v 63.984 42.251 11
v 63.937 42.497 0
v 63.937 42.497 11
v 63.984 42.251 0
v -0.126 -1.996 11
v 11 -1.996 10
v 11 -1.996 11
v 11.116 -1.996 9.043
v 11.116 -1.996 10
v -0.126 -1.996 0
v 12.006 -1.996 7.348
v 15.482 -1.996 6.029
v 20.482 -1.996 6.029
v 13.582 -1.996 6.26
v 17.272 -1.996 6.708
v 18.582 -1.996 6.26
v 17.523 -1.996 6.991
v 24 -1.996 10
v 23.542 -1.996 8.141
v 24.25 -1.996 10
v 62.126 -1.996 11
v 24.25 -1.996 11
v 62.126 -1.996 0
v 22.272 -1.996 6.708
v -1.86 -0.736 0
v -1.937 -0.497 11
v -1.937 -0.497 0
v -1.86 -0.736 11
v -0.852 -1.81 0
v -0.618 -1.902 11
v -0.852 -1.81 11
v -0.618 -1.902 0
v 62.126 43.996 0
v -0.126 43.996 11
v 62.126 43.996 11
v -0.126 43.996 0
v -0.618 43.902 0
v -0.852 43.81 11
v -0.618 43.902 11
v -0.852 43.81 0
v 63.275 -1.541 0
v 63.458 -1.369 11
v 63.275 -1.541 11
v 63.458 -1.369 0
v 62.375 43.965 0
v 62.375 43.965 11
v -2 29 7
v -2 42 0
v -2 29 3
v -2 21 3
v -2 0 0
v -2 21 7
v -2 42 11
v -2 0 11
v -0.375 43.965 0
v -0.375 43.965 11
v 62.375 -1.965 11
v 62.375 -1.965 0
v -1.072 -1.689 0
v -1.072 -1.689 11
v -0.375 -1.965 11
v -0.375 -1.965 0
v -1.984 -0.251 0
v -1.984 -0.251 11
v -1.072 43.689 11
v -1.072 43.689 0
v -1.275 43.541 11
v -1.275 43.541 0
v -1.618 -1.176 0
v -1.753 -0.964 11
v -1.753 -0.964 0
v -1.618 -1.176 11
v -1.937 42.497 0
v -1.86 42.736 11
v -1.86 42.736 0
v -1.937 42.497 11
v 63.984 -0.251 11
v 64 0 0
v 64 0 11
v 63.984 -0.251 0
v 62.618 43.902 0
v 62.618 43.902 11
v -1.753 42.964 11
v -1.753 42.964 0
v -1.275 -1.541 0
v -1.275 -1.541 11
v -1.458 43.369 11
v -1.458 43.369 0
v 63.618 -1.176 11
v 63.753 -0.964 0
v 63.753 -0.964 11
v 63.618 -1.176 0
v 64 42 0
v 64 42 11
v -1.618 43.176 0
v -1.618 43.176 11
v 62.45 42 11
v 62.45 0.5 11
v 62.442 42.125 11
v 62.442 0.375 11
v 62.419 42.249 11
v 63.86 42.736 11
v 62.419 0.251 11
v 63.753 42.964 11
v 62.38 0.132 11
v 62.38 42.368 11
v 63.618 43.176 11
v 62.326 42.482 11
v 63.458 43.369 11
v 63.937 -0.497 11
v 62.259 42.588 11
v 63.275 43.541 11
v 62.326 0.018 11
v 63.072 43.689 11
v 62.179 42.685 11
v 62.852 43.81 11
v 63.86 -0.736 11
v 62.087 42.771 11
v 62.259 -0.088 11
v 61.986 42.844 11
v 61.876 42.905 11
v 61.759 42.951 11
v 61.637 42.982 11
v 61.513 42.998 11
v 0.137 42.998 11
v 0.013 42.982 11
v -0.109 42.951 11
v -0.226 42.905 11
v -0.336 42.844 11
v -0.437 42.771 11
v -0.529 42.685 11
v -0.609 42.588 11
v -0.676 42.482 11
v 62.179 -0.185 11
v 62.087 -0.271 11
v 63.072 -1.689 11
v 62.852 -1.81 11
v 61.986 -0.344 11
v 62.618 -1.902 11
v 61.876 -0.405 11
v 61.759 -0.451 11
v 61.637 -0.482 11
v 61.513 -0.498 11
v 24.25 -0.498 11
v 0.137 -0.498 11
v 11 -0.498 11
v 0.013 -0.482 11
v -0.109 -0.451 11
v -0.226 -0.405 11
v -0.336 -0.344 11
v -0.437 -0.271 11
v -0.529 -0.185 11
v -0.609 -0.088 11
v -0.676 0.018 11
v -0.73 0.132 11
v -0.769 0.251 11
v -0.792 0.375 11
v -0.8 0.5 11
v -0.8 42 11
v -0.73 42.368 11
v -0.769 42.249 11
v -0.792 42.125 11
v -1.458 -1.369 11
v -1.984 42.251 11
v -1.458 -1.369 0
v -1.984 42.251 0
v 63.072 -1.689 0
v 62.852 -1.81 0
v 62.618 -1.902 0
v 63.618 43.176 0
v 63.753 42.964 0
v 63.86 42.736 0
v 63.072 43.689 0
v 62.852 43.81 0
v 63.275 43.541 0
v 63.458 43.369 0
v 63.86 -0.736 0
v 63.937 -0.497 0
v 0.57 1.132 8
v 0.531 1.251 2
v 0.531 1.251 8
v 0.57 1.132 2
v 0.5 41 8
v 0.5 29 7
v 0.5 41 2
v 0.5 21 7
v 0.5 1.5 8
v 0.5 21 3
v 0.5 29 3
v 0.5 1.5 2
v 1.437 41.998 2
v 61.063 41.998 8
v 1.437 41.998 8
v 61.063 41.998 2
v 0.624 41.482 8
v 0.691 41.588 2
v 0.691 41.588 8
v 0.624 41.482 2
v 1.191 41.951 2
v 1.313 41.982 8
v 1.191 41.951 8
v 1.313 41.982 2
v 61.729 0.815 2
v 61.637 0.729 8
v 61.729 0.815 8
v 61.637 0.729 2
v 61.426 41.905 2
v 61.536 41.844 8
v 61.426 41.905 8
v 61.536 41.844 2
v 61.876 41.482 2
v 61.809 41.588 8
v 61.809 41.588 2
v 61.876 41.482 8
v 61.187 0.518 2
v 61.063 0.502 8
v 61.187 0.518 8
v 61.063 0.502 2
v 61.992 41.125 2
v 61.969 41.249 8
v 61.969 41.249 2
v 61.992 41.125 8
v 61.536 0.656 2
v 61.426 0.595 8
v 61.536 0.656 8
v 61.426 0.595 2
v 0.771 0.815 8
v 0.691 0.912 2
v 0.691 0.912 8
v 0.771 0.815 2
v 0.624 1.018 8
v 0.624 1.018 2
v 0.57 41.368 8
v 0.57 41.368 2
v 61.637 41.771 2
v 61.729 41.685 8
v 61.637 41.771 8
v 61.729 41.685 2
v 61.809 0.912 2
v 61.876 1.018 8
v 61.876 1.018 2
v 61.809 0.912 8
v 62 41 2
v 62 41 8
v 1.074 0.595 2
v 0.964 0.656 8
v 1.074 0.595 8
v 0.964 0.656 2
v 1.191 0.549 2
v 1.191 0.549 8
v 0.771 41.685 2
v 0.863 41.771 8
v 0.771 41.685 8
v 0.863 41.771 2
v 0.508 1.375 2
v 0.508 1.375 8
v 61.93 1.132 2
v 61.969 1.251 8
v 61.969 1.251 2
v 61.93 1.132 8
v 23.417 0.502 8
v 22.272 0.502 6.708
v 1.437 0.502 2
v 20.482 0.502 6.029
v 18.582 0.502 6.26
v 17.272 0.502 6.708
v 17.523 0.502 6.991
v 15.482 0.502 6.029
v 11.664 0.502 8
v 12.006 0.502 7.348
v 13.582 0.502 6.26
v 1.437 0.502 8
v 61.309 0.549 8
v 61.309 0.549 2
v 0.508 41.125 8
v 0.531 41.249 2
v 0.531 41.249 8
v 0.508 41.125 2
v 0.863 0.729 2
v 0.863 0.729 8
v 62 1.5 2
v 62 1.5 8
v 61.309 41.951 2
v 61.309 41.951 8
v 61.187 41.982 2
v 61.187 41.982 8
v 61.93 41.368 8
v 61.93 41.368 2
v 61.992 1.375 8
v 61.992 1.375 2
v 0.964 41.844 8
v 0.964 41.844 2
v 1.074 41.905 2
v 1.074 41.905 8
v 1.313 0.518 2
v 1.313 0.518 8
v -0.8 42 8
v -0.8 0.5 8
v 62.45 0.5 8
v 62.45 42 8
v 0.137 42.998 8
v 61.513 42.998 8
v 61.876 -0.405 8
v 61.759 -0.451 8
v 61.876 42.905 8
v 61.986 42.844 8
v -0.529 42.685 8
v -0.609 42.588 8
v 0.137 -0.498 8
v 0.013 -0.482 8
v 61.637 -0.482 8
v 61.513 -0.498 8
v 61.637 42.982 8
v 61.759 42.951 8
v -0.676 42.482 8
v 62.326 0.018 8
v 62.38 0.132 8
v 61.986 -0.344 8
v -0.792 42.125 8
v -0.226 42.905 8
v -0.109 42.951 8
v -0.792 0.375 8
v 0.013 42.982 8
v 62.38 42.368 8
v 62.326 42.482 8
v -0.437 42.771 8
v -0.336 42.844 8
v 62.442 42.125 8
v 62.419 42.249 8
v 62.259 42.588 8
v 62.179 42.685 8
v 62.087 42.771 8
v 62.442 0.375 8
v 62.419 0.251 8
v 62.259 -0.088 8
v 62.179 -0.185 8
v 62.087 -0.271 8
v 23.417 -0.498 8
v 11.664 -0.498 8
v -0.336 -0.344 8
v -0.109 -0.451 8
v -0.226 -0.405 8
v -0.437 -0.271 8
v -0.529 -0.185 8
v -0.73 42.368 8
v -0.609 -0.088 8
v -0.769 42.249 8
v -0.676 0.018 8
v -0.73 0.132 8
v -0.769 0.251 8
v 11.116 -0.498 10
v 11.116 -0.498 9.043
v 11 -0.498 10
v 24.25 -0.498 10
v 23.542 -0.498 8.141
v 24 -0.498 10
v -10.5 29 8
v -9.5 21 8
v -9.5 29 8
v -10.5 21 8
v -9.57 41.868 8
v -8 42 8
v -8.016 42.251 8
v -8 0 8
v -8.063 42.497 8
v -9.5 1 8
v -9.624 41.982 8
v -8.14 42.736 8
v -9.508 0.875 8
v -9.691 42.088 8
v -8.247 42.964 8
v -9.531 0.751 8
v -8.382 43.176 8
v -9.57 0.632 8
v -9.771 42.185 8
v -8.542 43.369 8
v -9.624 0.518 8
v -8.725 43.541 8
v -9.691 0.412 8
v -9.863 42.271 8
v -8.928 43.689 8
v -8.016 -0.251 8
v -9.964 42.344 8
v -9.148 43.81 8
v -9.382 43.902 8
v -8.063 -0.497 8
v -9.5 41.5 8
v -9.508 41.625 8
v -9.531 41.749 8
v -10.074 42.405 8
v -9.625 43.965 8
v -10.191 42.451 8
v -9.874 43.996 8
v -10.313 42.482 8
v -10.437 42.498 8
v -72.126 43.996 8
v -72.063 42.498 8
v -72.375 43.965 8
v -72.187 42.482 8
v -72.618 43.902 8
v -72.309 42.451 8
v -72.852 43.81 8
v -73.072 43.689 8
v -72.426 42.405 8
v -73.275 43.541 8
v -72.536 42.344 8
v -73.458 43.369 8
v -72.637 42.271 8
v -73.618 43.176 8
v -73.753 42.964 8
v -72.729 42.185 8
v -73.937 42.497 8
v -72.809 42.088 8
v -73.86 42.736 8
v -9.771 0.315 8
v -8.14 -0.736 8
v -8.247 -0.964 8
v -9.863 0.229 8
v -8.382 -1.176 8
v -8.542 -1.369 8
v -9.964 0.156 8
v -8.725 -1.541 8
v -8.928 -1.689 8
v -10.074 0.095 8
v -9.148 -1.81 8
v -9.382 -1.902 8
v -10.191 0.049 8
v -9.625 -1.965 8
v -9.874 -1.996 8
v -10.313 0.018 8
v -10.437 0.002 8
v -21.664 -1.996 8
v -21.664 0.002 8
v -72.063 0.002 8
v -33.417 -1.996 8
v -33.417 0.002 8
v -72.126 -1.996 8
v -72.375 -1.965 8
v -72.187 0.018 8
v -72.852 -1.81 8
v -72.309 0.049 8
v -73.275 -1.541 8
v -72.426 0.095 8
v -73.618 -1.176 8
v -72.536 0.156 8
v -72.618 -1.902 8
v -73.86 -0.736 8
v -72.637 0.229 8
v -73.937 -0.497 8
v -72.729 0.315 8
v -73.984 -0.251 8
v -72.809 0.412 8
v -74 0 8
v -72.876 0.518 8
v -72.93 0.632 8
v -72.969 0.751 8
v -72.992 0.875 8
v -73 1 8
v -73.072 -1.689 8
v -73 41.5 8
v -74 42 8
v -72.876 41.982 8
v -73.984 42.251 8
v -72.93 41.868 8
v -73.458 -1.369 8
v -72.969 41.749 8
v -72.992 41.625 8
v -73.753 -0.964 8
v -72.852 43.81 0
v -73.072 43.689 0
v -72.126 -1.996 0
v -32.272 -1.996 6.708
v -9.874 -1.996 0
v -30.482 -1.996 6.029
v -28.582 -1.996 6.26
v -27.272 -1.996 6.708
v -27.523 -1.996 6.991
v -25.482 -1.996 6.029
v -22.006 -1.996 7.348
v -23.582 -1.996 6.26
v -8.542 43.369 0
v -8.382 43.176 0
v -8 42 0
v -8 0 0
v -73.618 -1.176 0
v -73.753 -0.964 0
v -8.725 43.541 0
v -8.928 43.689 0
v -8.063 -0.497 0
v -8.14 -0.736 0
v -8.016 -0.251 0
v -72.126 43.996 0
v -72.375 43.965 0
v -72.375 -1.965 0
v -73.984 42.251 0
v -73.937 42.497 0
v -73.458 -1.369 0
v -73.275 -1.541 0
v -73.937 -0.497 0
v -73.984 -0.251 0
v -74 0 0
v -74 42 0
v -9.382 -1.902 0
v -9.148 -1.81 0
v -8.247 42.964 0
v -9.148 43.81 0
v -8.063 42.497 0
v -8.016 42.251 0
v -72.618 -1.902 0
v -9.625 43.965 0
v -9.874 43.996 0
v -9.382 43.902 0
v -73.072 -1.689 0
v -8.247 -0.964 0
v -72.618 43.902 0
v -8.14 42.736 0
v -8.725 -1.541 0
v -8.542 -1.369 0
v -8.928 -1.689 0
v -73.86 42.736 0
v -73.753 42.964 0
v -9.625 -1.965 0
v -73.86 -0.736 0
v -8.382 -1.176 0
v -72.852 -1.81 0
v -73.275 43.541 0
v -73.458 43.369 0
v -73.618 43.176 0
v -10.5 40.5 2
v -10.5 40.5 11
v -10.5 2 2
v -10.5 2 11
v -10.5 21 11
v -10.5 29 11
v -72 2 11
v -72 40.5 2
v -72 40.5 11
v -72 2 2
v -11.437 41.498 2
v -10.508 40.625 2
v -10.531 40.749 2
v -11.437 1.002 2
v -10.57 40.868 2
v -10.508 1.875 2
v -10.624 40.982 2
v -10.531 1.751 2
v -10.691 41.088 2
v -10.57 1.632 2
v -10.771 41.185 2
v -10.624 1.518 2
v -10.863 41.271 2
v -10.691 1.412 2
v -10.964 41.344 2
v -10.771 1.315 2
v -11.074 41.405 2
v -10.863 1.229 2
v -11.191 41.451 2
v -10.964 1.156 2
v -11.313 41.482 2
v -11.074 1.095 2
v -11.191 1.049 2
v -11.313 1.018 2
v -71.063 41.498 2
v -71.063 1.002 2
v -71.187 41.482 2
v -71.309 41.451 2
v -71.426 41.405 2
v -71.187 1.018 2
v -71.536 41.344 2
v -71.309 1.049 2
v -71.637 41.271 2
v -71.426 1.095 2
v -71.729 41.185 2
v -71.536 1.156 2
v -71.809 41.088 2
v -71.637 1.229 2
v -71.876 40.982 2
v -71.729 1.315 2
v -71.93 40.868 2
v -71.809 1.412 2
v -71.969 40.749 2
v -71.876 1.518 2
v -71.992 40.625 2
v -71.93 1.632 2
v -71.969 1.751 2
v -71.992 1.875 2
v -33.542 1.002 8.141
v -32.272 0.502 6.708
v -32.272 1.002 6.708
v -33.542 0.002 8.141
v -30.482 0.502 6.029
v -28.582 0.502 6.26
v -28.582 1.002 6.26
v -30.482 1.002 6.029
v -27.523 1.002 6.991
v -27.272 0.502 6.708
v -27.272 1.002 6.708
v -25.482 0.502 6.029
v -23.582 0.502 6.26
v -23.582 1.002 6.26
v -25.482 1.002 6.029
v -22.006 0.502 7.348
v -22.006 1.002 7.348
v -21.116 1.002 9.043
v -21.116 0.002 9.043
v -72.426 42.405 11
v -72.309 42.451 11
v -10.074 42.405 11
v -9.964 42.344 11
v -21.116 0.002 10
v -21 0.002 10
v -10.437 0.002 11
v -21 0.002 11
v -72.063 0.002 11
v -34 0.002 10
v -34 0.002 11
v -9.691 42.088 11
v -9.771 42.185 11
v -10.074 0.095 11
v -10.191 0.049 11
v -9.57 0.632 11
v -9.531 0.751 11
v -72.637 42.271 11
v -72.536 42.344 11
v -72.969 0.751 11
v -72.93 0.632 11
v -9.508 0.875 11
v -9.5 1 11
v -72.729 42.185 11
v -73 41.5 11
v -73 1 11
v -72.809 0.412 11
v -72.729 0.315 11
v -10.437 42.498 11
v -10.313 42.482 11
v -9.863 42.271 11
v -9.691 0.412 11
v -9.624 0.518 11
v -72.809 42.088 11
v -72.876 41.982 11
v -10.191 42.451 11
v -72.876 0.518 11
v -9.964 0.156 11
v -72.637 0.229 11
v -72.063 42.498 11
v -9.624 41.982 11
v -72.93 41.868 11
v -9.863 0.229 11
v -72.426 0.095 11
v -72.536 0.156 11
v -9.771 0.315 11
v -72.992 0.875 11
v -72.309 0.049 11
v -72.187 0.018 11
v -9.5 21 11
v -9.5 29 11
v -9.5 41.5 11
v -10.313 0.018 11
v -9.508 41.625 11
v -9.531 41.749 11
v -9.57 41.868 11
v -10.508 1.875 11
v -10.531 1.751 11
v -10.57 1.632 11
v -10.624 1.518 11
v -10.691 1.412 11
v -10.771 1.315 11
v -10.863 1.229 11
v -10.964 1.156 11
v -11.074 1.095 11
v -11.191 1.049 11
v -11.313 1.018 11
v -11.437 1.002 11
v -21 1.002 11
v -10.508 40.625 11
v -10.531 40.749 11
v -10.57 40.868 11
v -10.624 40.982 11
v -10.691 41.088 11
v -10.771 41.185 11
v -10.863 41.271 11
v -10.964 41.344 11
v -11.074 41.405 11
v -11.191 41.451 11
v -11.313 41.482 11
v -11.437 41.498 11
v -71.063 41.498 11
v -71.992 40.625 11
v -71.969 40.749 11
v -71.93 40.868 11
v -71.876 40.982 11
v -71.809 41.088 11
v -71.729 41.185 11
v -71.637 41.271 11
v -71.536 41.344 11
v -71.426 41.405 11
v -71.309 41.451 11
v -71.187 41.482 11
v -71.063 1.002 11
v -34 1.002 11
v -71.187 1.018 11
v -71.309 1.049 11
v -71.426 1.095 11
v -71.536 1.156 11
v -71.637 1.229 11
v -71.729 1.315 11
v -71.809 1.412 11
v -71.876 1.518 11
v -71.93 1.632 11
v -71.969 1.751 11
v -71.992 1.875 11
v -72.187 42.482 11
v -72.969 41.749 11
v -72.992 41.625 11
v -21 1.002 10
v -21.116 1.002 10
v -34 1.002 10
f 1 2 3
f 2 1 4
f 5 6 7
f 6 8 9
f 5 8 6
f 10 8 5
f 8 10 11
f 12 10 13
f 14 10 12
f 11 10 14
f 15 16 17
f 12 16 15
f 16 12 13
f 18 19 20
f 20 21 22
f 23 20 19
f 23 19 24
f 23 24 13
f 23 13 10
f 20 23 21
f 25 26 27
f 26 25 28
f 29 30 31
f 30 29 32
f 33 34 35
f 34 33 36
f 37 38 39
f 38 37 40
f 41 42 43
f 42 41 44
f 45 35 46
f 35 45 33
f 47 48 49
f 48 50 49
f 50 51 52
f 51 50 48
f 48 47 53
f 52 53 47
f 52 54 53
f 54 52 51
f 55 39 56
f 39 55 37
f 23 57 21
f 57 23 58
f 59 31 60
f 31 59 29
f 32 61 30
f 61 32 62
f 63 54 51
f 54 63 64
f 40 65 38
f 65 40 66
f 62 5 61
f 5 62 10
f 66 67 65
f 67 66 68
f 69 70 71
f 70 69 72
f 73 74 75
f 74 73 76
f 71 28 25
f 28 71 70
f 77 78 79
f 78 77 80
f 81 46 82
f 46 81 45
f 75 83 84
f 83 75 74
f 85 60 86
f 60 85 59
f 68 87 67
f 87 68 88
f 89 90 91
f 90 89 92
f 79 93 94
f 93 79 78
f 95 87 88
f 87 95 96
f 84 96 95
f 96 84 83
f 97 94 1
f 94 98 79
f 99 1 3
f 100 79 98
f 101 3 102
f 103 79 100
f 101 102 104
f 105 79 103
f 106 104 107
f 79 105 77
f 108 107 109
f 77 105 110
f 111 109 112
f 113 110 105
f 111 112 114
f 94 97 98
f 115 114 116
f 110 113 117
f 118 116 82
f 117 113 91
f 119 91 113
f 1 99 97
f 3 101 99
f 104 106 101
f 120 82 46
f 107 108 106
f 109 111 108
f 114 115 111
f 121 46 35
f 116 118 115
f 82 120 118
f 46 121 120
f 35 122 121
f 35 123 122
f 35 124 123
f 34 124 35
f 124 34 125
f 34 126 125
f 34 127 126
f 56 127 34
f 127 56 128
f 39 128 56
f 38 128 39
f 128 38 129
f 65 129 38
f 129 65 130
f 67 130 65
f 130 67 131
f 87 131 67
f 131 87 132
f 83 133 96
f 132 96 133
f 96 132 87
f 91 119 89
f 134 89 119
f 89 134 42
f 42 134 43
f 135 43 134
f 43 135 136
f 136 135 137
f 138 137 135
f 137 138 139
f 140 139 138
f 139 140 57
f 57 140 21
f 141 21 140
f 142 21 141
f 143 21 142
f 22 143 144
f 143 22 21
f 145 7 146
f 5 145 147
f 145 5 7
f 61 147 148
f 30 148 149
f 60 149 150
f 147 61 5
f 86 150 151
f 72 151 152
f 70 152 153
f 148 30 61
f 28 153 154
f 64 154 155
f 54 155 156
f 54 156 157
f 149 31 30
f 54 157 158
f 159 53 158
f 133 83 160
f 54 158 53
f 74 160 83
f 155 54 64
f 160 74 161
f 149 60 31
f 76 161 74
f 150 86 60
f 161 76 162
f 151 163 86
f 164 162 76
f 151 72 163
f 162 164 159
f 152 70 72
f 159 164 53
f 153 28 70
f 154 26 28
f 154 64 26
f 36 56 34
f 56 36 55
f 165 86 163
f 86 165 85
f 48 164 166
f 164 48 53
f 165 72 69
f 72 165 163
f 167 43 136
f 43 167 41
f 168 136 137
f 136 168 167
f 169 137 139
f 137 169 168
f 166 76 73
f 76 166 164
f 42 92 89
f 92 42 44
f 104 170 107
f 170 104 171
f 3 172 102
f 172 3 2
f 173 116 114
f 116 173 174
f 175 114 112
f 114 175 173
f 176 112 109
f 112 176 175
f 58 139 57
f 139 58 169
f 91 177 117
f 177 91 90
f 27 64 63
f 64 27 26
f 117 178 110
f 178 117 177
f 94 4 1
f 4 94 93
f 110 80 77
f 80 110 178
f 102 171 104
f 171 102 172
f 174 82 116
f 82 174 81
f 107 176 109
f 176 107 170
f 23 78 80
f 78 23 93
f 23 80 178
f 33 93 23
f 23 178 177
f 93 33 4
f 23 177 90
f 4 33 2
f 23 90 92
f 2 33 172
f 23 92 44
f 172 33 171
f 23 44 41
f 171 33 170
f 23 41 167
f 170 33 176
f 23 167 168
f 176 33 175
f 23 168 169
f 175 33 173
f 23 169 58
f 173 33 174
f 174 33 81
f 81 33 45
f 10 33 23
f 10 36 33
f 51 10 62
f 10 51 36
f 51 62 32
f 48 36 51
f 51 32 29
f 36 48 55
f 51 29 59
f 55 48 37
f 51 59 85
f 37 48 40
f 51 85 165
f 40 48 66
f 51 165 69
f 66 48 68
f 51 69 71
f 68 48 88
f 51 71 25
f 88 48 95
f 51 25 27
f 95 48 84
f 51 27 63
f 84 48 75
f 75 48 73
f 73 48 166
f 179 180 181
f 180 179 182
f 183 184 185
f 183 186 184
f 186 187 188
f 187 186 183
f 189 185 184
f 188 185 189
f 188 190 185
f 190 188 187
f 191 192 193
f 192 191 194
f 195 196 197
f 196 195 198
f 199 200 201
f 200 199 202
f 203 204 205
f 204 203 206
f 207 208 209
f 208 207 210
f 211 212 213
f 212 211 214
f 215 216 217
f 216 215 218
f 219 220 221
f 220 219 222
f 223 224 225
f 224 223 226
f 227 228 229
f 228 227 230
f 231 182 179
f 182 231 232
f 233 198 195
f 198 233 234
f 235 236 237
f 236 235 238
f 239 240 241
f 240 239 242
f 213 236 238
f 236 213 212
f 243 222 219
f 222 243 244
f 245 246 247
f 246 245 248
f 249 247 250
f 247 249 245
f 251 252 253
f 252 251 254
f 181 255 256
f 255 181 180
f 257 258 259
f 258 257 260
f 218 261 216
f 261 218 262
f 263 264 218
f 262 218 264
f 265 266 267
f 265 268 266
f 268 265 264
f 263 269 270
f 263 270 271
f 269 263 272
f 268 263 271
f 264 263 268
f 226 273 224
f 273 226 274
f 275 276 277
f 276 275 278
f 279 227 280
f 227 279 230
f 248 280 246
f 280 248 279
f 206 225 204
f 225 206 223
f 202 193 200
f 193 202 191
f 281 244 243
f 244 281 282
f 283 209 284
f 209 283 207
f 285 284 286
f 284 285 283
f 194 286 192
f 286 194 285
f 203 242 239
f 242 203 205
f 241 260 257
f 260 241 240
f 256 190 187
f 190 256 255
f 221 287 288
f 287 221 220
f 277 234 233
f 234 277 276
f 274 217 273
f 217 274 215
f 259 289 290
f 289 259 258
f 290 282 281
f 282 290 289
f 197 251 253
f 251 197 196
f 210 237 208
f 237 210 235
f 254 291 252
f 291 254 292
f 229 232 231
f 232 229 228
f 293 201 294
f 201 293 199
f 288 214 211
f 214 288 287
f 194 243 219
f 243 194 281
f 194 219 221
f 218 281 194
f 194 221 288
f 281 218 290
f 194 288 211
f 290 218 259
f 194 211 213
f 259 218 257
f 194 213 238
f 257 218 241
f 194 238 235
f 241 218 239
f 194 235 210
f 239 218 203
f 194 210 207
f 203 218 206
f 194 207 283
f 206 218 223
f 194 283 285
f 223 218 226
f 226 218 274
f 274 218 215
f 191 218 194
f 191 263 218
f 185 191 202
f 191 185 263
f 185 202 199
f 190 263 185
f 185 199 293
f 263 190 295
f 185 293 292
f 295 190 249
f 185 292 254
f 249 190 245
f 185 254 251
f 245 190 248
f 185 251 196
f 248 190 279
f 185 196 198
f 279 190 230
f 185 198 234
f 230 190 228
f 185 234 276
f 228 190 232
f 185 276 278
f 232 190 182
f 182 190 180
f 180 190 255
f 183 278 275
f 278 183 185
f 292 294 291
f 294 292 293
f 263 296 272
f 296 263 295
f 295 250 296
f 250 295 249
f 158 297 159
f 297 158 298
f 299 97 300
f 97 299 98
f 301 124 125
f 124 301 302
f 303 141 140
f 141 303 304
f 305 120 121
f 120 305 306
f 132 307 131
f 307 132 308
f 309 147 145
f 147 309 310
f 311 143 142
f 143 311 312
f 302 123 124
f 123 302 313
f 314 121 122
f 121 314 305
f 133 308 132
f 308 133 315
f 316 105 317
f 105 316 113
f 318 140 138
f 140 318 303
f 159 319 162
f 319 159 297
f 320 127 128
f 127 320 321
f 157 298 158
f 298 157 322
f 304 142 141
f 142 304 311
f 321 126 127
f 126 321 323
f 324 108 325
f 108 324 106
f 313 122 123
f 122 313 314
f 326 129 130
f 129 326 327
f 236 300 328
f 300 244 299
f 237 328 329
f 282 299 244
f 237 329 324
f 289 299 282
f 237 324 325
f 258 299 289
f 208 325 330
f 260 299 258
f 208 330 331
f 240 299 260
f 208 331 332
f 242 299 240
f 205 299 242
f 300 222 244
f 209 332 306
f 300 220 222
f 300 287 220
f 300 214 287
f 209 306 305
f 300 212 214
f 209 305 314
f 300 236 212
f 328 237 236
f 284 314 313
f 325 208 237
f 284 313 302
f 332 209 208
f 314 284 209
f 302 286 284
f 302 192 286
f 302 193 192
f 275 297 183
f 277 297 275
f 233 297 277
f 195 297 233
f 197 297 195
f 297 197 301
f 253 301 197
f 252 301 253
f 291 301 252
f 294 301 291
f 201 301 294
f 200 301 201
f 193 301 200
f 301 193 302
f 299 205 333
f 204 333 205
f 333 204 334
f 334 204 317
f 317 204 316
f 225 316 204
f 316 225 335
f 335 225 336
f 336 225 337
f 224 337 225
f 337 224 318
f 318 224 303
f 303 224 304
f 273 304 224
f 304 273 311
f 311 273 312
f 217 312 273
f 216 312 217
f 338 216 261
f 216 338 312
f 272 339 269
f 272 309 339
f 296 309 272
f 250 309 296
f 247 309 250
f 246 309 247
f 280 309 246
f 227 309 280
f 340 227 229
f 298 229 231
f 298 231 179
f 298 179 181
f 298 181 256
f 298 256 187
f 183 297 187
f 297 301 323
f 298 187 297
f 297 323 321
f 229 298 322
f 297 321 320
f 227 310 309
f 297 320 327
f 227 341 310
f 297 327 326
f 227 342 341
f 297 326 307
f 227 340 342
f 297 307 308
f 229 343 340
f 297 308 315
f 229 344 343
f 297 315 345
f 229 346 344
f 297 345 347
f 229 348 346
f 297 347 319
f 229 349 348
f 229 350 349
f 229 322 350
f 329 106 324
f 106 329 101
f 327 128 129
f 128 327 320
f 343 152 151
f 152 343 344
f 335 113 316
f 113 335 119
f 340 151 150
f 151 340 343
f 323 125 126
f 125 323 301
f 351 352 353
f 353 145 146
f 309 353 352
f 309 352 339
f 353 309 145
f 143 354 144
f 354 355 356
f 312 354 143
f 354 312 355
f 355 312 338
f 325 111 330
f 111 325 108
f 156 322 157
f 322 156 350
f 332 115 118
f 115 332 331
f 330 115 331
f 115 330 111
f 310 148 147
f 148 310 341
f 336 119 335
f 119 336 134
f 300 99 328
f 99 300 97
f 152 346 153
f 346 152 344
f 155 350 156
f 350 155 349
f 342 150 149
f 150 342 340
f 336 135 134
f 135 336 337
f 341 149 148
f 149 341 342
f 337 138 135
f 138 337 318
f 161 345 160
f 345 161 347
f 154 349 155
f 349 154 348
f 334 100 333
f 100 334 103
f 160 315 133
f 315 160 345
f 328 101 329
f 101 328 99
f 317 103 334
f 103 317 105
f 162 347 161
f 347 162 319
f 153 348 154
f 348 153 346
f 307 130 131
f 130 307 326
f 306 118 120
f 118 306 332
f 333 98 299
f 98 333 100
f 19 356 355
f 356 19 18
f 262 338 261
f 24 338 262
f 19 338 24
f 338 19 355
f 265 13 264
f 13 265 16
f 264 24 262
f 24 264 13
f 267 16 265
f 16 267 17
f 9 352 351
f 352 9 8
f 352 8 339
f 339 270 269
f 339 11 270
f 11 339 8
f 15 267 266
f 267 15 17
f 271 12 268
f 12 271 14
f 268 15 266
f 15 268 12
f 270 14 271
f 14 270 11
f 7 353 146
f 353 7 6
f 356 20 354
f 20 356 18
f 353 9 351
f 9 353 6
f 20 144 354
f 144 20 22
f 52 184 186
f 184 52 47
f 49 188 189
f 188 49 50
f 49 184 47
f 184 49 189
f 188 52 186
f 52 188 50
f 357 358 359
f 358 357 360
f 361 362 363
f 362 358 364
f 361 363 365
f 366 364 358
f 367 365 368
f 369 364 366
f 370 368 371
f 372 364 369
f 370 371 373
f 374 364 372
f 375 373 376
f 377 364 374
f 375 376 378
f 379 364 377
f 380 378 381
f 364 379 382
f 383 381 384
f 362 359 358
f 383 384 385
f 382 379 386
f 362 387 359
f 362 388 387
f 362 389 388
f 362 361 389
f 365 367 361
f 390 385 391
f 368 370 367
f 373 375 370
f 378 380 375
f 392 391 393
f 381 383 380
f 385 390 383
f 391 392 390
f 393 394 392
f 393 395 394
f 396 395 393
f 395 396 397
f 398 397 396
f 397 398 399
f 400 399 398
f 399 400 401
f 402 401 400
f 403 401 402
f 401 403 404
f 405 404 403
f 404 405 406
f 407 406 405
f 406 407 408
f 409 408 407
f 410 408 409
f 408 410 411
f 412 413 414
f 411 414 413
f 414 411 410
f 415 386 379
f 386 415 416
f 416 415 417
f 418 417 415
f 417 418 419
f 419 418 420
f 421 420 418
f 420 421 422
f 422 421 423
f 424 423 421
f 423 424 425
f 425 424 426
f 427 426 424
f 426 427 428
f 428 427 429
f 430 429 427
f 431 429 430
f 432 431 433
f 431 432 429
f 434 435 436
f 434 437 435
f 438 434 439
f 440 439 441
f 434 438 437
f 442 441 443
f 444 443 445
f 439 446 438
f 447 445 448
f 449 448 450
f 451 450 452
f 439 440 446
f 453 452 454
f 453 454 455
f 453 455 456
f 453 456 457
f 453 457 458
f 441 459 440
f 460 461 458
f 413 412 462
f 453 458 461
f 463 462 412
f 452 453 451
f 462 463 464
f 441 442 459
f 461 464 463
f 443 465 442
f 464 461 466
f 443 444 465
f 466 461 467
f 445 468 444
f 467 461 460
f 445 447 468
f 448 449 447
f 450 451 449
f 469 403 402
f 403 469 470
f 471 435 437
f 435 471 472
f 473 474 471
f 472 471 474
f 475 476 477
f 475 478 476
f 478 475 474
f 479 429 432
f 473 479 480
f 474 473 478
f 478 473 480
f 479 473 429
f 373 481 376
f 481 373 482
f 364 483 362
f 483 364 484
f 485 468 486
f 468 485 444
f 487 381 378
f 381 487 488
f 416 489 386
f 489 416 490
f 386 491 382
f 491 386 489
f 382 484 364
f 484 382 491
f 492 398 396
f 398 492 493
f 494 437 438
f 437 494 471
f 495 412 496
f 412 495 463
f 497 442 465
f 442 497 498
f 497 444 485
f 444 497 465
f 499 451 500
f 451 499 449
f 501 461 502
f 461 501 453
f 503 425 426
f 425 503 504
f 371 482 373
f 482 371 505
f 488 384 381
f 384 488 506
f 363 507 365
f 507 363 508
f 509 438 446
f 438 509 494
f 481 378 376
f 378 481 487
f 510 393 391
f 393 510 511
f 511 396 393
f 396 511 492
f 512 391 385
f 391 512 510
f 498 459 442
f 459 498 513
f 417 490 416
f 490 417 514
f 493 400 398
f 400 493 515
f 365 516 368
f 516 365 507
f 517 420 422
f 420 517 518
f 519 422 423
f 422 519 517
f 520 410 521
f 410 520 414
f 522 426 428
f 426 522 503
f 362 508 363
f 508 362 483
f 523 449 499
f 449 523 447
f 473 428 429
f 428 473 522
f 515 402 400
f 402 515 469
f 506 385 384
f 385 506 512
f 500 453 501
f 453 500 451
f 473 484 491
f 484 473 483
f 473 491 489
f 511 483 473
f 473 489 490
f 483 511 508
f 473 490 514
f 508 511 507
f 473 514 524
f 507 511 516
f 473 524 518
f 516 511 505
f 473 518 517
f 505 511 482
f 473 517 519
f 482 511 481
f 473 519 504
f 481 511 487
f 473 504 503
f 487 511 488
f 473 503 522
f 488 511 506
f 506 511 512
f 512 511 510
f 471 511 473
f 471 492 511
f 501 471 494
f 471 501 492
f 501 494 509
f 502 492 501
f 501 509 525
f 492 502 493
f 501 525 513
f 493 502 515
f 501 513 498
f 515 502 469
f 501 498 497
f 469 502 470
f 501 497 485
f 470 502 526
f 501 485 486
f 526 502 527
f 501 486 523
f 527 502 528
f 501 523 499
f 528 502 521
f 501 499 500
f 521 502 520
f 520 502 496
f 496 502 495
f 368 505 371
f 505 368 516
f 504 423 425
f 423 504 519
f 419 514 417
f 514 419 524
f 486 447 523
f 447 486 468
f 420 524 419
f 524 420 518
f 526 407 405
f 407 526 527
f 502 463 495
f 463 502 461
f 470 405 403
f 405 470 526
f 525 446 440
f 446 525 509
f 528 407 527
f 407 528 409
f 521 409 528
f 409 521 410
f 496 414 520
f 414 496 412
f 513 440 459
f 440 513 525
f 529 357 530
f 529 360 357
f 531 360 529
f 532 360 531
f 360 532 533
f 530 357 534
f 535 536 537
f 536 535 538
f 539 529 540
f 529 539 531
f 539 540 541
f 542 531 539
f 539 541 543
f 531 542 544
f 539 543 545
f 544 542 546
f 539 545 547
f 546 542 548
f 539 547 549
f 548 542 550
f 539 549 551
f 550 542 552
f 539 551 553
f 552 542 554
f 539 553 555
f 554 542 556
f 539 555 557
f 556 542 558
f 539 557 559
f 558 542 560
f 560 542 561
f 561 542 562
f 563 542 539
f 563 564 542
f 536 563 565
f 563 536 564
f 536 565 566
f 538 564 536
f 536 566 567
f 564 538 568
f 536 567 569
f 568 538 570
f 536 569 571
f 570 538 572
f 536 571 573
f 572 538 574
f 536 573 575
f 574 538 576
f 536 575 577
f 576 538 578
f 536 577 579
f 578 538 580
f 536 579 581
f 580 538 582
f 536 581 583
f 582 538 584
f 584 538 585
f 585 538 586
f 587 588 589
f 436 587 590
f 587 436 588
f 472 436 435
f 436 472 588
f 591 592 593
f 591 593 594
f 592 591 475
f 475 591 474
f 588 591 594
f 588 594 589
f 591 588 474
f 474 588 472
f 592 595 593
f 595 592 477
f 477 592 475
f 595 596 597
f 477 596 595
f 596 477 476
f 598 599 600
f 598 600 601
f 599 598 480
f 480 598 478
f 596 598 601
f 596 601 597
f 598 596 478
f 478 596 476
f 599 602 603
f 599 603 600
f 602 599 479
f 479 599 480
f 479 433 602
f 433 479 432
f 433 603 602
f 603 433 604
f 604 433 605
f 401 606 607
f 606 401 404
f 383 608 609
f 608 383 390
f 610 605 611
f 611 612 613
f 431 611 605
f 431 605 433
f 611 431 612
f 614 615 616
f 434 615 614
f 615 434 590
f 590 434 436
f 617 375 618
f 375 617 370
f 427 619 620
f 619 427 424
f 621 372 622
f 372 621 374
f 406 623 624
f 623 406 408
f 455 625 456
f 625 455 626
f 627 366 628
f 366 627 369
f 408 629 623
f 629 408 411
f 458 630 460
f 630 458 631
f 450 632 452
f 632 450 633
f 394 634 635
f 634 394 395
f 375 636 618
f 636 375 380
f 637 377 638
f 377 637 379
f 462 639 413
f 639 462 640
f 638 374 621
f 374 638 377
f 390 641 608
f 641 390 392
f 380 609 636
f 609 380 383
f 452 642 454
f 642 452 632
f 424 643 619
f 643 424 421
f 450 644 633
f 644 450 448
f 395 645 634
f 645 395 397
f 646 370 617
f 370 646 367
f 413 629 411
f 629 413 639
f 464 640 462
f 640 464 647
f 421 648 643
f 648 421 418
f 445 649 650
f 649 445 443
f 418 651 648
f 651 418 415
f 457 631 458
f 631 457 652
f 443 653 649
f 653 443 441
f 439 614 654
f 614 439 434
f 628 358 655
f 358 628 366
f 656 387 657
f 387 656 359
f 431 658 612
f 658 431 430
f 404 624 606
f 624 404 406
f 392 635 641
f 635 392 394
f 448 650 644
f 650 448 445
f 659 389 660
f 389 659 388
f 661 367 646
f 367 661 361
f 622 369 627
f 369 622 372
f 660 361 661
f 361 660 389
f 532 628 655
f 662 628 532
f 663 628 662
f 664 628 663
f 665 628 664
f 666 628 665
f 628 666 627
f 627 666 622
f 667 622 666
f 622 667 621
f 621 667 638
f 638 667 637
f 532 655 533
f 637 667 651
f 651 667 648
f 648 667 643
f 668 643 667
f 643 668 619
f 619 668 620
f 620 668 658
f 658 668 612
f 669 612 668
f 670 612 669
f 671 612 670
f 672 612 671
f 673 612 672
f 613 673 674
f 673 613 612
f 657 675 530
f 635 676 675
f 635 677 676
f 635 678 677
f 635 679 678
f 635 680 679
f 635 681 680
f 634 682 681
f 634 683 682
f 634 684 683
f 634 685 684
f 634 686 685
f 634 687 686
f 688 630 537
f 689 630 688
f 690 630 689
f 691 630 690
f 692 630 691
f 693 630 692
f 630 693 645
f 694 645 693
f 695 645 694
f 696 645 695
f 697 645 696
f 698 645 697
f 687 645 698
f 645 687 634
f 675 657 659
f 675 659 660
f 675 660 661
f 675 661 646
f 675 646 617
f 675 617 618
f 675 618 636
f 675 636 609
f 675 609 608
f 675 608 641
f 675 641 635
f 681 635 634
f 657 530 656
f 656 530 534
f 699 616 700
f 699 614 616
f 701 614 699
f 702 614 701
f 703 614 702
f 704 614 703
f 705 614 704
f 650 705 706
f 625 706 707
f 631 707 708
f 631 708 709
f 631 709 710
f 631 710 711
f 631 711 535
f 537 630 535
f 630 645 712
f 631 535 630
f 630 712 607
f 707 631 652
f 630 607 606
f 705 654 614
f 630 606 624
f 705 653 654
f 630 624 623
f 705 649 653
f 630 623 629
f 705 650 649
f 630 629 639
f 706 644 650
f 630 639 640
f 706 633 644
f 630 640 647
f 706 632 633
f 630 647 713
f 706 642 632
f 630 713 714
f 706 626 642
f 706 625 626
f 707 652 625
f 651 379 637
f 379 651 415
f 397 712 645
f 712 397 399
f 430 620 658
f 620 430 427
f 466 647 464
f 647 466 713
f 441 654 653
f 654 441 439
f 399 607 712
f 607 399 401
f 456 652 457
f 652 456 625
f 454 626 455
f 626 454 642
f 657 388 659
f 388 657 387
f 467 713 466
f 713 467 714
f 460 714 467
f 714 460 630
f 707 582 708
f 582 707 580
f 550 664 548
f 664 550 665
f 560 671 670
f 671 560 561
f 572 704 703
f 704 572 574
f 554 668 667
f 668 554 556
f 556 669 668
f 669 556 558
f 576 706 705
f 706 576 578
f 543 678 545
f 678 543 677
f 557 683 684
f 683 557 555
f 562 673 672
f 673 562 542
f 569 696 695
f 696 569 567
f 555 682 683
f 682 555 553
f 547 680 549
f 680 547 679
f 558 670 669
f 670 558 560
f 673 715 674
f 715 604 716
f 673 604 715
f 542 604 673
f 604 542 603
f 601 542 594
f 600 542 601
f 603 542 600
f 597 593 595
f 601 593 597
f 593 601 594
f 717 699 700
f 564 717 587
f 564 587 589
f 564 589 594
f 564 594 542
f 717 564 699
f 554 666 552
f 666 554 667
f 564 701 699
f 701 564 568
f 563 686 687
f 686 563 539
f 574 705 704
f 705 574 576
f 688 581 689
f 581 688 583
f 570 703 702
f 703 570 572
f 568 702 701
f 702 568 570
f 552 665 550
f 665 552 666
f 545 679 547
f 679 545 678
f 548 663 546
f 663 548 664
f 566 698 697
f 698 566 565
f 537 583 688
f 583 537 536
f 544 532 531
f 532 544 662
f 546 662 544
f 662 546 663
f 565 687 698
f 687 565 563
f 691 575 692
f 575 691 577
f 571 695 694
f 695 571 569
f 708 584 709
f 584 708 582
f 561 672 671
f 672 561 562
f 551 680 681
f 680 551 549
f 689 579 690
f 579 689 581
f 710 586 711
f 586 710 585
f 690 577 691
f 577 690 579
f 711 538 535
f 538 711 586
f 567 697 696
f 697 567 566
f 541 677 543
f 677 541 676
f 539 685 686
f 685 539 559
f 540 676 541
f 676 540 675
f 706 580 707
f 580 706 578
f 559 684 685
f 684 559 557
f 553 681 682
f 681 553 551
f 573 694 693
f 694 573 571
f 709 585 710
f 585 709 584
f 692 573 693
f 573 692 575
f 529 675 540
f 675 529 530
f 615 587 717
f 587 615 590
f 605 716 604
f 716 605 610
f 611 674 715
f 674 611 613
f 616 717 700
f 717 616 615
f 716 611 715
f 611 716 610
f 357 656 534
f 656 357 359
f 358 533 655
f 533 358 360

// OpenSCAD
// Simple OpenSCAD script to generate a case for the IR blaster.
// Created by Jay Boehm <jayrox@gmail.com> 2017

cube_half(size = [63, 43, 10], side = "top");

mirror([1,0,0]) 
    translate([10, 0, 0])
    cube_half(size = [63, 43, 10], side = "bottom");

module cube_half(size, side = "top") {
    w = size[0];
    d = size[1];
    h = (side == "top") ? size[2] : size[2] - 3;
    
    difference() {
        miniround([w, d, h], 2);
        // Hollow
        translate([1.5, 1.5, 2]) {
            miniround([w - 3, d - 3, h - 1], 1);    
        }

        // Outer Lip
        if (side == "top") {
            translate([0.20, 0.5, 8]) {
                miniround([w - 1.25, d - 1, 3], 1);    
            }
        }

        // LED ports
        rotate([90, 0, 0]) {
            translate([20, 10, -5]) 
                color("red")
                cylinder(h=10, r=4);
        }
        rotate([90, 0, 0]) {
            translate([15, 10, -5]) 
                color("red")
                cylinder(h=10, r=4);

        }
        // This squares off the edges around the LED ports
        rotate([90, 0, 0]) {
            translate([11, 10, -5])
                color("red")
                cube([13.25,5,10]);

        }

        if (side == "top") {
            // USB port
            translate([-5, 21, 3]) {
                color("red")
                cube([10, 8, h / 2 -1]);
            }
        }
    }
    // Outer Lip
    if (side == "bottom") {
        translate([0.5, 1, 0]) {
            difference() {
                miniround([w - 1, d - 2, h + 3], 1);    
                // Hollow
                translate([1, 1, 0]) {
                    miniround([w-3, d-4, h + 4], 1);    
                }
                // LED ports
                rotate([90, 0, 0]) {
                    translate([19.5, 10, -5]) 
                        color("red")
                        cylinder(h=10, r=4);
                }
                rotate([90, 0, 0]) {
                    translate([14.5, 10, -5]) 
                        color("red")
                        cylinder(h=10, r=4);

                }
                // This squares off the edges around the LED ports
                rotate([90, 0, 0]) {
                    translate([10.5, 10, -5])
                        color("red")
                        cube([13,5,10]);

                }
                // USB port
                translate([-5, 20, 7]) {
                    color("red")
                    cube([10, 8, h / 2 + 2]);
                }
            }
        }
    }
}

module miniround(size, radius) {
    $fn=50;
    x = size[0]-radius/2;
    y = size[1]-radius/2;

    minkowski()
    {
        cube(size=[x,y,size[2]]);
        cylinder(r=radius);
        // Using a sphere is possible, but will kill performance
        //sphere(r=radius);
    }
}
